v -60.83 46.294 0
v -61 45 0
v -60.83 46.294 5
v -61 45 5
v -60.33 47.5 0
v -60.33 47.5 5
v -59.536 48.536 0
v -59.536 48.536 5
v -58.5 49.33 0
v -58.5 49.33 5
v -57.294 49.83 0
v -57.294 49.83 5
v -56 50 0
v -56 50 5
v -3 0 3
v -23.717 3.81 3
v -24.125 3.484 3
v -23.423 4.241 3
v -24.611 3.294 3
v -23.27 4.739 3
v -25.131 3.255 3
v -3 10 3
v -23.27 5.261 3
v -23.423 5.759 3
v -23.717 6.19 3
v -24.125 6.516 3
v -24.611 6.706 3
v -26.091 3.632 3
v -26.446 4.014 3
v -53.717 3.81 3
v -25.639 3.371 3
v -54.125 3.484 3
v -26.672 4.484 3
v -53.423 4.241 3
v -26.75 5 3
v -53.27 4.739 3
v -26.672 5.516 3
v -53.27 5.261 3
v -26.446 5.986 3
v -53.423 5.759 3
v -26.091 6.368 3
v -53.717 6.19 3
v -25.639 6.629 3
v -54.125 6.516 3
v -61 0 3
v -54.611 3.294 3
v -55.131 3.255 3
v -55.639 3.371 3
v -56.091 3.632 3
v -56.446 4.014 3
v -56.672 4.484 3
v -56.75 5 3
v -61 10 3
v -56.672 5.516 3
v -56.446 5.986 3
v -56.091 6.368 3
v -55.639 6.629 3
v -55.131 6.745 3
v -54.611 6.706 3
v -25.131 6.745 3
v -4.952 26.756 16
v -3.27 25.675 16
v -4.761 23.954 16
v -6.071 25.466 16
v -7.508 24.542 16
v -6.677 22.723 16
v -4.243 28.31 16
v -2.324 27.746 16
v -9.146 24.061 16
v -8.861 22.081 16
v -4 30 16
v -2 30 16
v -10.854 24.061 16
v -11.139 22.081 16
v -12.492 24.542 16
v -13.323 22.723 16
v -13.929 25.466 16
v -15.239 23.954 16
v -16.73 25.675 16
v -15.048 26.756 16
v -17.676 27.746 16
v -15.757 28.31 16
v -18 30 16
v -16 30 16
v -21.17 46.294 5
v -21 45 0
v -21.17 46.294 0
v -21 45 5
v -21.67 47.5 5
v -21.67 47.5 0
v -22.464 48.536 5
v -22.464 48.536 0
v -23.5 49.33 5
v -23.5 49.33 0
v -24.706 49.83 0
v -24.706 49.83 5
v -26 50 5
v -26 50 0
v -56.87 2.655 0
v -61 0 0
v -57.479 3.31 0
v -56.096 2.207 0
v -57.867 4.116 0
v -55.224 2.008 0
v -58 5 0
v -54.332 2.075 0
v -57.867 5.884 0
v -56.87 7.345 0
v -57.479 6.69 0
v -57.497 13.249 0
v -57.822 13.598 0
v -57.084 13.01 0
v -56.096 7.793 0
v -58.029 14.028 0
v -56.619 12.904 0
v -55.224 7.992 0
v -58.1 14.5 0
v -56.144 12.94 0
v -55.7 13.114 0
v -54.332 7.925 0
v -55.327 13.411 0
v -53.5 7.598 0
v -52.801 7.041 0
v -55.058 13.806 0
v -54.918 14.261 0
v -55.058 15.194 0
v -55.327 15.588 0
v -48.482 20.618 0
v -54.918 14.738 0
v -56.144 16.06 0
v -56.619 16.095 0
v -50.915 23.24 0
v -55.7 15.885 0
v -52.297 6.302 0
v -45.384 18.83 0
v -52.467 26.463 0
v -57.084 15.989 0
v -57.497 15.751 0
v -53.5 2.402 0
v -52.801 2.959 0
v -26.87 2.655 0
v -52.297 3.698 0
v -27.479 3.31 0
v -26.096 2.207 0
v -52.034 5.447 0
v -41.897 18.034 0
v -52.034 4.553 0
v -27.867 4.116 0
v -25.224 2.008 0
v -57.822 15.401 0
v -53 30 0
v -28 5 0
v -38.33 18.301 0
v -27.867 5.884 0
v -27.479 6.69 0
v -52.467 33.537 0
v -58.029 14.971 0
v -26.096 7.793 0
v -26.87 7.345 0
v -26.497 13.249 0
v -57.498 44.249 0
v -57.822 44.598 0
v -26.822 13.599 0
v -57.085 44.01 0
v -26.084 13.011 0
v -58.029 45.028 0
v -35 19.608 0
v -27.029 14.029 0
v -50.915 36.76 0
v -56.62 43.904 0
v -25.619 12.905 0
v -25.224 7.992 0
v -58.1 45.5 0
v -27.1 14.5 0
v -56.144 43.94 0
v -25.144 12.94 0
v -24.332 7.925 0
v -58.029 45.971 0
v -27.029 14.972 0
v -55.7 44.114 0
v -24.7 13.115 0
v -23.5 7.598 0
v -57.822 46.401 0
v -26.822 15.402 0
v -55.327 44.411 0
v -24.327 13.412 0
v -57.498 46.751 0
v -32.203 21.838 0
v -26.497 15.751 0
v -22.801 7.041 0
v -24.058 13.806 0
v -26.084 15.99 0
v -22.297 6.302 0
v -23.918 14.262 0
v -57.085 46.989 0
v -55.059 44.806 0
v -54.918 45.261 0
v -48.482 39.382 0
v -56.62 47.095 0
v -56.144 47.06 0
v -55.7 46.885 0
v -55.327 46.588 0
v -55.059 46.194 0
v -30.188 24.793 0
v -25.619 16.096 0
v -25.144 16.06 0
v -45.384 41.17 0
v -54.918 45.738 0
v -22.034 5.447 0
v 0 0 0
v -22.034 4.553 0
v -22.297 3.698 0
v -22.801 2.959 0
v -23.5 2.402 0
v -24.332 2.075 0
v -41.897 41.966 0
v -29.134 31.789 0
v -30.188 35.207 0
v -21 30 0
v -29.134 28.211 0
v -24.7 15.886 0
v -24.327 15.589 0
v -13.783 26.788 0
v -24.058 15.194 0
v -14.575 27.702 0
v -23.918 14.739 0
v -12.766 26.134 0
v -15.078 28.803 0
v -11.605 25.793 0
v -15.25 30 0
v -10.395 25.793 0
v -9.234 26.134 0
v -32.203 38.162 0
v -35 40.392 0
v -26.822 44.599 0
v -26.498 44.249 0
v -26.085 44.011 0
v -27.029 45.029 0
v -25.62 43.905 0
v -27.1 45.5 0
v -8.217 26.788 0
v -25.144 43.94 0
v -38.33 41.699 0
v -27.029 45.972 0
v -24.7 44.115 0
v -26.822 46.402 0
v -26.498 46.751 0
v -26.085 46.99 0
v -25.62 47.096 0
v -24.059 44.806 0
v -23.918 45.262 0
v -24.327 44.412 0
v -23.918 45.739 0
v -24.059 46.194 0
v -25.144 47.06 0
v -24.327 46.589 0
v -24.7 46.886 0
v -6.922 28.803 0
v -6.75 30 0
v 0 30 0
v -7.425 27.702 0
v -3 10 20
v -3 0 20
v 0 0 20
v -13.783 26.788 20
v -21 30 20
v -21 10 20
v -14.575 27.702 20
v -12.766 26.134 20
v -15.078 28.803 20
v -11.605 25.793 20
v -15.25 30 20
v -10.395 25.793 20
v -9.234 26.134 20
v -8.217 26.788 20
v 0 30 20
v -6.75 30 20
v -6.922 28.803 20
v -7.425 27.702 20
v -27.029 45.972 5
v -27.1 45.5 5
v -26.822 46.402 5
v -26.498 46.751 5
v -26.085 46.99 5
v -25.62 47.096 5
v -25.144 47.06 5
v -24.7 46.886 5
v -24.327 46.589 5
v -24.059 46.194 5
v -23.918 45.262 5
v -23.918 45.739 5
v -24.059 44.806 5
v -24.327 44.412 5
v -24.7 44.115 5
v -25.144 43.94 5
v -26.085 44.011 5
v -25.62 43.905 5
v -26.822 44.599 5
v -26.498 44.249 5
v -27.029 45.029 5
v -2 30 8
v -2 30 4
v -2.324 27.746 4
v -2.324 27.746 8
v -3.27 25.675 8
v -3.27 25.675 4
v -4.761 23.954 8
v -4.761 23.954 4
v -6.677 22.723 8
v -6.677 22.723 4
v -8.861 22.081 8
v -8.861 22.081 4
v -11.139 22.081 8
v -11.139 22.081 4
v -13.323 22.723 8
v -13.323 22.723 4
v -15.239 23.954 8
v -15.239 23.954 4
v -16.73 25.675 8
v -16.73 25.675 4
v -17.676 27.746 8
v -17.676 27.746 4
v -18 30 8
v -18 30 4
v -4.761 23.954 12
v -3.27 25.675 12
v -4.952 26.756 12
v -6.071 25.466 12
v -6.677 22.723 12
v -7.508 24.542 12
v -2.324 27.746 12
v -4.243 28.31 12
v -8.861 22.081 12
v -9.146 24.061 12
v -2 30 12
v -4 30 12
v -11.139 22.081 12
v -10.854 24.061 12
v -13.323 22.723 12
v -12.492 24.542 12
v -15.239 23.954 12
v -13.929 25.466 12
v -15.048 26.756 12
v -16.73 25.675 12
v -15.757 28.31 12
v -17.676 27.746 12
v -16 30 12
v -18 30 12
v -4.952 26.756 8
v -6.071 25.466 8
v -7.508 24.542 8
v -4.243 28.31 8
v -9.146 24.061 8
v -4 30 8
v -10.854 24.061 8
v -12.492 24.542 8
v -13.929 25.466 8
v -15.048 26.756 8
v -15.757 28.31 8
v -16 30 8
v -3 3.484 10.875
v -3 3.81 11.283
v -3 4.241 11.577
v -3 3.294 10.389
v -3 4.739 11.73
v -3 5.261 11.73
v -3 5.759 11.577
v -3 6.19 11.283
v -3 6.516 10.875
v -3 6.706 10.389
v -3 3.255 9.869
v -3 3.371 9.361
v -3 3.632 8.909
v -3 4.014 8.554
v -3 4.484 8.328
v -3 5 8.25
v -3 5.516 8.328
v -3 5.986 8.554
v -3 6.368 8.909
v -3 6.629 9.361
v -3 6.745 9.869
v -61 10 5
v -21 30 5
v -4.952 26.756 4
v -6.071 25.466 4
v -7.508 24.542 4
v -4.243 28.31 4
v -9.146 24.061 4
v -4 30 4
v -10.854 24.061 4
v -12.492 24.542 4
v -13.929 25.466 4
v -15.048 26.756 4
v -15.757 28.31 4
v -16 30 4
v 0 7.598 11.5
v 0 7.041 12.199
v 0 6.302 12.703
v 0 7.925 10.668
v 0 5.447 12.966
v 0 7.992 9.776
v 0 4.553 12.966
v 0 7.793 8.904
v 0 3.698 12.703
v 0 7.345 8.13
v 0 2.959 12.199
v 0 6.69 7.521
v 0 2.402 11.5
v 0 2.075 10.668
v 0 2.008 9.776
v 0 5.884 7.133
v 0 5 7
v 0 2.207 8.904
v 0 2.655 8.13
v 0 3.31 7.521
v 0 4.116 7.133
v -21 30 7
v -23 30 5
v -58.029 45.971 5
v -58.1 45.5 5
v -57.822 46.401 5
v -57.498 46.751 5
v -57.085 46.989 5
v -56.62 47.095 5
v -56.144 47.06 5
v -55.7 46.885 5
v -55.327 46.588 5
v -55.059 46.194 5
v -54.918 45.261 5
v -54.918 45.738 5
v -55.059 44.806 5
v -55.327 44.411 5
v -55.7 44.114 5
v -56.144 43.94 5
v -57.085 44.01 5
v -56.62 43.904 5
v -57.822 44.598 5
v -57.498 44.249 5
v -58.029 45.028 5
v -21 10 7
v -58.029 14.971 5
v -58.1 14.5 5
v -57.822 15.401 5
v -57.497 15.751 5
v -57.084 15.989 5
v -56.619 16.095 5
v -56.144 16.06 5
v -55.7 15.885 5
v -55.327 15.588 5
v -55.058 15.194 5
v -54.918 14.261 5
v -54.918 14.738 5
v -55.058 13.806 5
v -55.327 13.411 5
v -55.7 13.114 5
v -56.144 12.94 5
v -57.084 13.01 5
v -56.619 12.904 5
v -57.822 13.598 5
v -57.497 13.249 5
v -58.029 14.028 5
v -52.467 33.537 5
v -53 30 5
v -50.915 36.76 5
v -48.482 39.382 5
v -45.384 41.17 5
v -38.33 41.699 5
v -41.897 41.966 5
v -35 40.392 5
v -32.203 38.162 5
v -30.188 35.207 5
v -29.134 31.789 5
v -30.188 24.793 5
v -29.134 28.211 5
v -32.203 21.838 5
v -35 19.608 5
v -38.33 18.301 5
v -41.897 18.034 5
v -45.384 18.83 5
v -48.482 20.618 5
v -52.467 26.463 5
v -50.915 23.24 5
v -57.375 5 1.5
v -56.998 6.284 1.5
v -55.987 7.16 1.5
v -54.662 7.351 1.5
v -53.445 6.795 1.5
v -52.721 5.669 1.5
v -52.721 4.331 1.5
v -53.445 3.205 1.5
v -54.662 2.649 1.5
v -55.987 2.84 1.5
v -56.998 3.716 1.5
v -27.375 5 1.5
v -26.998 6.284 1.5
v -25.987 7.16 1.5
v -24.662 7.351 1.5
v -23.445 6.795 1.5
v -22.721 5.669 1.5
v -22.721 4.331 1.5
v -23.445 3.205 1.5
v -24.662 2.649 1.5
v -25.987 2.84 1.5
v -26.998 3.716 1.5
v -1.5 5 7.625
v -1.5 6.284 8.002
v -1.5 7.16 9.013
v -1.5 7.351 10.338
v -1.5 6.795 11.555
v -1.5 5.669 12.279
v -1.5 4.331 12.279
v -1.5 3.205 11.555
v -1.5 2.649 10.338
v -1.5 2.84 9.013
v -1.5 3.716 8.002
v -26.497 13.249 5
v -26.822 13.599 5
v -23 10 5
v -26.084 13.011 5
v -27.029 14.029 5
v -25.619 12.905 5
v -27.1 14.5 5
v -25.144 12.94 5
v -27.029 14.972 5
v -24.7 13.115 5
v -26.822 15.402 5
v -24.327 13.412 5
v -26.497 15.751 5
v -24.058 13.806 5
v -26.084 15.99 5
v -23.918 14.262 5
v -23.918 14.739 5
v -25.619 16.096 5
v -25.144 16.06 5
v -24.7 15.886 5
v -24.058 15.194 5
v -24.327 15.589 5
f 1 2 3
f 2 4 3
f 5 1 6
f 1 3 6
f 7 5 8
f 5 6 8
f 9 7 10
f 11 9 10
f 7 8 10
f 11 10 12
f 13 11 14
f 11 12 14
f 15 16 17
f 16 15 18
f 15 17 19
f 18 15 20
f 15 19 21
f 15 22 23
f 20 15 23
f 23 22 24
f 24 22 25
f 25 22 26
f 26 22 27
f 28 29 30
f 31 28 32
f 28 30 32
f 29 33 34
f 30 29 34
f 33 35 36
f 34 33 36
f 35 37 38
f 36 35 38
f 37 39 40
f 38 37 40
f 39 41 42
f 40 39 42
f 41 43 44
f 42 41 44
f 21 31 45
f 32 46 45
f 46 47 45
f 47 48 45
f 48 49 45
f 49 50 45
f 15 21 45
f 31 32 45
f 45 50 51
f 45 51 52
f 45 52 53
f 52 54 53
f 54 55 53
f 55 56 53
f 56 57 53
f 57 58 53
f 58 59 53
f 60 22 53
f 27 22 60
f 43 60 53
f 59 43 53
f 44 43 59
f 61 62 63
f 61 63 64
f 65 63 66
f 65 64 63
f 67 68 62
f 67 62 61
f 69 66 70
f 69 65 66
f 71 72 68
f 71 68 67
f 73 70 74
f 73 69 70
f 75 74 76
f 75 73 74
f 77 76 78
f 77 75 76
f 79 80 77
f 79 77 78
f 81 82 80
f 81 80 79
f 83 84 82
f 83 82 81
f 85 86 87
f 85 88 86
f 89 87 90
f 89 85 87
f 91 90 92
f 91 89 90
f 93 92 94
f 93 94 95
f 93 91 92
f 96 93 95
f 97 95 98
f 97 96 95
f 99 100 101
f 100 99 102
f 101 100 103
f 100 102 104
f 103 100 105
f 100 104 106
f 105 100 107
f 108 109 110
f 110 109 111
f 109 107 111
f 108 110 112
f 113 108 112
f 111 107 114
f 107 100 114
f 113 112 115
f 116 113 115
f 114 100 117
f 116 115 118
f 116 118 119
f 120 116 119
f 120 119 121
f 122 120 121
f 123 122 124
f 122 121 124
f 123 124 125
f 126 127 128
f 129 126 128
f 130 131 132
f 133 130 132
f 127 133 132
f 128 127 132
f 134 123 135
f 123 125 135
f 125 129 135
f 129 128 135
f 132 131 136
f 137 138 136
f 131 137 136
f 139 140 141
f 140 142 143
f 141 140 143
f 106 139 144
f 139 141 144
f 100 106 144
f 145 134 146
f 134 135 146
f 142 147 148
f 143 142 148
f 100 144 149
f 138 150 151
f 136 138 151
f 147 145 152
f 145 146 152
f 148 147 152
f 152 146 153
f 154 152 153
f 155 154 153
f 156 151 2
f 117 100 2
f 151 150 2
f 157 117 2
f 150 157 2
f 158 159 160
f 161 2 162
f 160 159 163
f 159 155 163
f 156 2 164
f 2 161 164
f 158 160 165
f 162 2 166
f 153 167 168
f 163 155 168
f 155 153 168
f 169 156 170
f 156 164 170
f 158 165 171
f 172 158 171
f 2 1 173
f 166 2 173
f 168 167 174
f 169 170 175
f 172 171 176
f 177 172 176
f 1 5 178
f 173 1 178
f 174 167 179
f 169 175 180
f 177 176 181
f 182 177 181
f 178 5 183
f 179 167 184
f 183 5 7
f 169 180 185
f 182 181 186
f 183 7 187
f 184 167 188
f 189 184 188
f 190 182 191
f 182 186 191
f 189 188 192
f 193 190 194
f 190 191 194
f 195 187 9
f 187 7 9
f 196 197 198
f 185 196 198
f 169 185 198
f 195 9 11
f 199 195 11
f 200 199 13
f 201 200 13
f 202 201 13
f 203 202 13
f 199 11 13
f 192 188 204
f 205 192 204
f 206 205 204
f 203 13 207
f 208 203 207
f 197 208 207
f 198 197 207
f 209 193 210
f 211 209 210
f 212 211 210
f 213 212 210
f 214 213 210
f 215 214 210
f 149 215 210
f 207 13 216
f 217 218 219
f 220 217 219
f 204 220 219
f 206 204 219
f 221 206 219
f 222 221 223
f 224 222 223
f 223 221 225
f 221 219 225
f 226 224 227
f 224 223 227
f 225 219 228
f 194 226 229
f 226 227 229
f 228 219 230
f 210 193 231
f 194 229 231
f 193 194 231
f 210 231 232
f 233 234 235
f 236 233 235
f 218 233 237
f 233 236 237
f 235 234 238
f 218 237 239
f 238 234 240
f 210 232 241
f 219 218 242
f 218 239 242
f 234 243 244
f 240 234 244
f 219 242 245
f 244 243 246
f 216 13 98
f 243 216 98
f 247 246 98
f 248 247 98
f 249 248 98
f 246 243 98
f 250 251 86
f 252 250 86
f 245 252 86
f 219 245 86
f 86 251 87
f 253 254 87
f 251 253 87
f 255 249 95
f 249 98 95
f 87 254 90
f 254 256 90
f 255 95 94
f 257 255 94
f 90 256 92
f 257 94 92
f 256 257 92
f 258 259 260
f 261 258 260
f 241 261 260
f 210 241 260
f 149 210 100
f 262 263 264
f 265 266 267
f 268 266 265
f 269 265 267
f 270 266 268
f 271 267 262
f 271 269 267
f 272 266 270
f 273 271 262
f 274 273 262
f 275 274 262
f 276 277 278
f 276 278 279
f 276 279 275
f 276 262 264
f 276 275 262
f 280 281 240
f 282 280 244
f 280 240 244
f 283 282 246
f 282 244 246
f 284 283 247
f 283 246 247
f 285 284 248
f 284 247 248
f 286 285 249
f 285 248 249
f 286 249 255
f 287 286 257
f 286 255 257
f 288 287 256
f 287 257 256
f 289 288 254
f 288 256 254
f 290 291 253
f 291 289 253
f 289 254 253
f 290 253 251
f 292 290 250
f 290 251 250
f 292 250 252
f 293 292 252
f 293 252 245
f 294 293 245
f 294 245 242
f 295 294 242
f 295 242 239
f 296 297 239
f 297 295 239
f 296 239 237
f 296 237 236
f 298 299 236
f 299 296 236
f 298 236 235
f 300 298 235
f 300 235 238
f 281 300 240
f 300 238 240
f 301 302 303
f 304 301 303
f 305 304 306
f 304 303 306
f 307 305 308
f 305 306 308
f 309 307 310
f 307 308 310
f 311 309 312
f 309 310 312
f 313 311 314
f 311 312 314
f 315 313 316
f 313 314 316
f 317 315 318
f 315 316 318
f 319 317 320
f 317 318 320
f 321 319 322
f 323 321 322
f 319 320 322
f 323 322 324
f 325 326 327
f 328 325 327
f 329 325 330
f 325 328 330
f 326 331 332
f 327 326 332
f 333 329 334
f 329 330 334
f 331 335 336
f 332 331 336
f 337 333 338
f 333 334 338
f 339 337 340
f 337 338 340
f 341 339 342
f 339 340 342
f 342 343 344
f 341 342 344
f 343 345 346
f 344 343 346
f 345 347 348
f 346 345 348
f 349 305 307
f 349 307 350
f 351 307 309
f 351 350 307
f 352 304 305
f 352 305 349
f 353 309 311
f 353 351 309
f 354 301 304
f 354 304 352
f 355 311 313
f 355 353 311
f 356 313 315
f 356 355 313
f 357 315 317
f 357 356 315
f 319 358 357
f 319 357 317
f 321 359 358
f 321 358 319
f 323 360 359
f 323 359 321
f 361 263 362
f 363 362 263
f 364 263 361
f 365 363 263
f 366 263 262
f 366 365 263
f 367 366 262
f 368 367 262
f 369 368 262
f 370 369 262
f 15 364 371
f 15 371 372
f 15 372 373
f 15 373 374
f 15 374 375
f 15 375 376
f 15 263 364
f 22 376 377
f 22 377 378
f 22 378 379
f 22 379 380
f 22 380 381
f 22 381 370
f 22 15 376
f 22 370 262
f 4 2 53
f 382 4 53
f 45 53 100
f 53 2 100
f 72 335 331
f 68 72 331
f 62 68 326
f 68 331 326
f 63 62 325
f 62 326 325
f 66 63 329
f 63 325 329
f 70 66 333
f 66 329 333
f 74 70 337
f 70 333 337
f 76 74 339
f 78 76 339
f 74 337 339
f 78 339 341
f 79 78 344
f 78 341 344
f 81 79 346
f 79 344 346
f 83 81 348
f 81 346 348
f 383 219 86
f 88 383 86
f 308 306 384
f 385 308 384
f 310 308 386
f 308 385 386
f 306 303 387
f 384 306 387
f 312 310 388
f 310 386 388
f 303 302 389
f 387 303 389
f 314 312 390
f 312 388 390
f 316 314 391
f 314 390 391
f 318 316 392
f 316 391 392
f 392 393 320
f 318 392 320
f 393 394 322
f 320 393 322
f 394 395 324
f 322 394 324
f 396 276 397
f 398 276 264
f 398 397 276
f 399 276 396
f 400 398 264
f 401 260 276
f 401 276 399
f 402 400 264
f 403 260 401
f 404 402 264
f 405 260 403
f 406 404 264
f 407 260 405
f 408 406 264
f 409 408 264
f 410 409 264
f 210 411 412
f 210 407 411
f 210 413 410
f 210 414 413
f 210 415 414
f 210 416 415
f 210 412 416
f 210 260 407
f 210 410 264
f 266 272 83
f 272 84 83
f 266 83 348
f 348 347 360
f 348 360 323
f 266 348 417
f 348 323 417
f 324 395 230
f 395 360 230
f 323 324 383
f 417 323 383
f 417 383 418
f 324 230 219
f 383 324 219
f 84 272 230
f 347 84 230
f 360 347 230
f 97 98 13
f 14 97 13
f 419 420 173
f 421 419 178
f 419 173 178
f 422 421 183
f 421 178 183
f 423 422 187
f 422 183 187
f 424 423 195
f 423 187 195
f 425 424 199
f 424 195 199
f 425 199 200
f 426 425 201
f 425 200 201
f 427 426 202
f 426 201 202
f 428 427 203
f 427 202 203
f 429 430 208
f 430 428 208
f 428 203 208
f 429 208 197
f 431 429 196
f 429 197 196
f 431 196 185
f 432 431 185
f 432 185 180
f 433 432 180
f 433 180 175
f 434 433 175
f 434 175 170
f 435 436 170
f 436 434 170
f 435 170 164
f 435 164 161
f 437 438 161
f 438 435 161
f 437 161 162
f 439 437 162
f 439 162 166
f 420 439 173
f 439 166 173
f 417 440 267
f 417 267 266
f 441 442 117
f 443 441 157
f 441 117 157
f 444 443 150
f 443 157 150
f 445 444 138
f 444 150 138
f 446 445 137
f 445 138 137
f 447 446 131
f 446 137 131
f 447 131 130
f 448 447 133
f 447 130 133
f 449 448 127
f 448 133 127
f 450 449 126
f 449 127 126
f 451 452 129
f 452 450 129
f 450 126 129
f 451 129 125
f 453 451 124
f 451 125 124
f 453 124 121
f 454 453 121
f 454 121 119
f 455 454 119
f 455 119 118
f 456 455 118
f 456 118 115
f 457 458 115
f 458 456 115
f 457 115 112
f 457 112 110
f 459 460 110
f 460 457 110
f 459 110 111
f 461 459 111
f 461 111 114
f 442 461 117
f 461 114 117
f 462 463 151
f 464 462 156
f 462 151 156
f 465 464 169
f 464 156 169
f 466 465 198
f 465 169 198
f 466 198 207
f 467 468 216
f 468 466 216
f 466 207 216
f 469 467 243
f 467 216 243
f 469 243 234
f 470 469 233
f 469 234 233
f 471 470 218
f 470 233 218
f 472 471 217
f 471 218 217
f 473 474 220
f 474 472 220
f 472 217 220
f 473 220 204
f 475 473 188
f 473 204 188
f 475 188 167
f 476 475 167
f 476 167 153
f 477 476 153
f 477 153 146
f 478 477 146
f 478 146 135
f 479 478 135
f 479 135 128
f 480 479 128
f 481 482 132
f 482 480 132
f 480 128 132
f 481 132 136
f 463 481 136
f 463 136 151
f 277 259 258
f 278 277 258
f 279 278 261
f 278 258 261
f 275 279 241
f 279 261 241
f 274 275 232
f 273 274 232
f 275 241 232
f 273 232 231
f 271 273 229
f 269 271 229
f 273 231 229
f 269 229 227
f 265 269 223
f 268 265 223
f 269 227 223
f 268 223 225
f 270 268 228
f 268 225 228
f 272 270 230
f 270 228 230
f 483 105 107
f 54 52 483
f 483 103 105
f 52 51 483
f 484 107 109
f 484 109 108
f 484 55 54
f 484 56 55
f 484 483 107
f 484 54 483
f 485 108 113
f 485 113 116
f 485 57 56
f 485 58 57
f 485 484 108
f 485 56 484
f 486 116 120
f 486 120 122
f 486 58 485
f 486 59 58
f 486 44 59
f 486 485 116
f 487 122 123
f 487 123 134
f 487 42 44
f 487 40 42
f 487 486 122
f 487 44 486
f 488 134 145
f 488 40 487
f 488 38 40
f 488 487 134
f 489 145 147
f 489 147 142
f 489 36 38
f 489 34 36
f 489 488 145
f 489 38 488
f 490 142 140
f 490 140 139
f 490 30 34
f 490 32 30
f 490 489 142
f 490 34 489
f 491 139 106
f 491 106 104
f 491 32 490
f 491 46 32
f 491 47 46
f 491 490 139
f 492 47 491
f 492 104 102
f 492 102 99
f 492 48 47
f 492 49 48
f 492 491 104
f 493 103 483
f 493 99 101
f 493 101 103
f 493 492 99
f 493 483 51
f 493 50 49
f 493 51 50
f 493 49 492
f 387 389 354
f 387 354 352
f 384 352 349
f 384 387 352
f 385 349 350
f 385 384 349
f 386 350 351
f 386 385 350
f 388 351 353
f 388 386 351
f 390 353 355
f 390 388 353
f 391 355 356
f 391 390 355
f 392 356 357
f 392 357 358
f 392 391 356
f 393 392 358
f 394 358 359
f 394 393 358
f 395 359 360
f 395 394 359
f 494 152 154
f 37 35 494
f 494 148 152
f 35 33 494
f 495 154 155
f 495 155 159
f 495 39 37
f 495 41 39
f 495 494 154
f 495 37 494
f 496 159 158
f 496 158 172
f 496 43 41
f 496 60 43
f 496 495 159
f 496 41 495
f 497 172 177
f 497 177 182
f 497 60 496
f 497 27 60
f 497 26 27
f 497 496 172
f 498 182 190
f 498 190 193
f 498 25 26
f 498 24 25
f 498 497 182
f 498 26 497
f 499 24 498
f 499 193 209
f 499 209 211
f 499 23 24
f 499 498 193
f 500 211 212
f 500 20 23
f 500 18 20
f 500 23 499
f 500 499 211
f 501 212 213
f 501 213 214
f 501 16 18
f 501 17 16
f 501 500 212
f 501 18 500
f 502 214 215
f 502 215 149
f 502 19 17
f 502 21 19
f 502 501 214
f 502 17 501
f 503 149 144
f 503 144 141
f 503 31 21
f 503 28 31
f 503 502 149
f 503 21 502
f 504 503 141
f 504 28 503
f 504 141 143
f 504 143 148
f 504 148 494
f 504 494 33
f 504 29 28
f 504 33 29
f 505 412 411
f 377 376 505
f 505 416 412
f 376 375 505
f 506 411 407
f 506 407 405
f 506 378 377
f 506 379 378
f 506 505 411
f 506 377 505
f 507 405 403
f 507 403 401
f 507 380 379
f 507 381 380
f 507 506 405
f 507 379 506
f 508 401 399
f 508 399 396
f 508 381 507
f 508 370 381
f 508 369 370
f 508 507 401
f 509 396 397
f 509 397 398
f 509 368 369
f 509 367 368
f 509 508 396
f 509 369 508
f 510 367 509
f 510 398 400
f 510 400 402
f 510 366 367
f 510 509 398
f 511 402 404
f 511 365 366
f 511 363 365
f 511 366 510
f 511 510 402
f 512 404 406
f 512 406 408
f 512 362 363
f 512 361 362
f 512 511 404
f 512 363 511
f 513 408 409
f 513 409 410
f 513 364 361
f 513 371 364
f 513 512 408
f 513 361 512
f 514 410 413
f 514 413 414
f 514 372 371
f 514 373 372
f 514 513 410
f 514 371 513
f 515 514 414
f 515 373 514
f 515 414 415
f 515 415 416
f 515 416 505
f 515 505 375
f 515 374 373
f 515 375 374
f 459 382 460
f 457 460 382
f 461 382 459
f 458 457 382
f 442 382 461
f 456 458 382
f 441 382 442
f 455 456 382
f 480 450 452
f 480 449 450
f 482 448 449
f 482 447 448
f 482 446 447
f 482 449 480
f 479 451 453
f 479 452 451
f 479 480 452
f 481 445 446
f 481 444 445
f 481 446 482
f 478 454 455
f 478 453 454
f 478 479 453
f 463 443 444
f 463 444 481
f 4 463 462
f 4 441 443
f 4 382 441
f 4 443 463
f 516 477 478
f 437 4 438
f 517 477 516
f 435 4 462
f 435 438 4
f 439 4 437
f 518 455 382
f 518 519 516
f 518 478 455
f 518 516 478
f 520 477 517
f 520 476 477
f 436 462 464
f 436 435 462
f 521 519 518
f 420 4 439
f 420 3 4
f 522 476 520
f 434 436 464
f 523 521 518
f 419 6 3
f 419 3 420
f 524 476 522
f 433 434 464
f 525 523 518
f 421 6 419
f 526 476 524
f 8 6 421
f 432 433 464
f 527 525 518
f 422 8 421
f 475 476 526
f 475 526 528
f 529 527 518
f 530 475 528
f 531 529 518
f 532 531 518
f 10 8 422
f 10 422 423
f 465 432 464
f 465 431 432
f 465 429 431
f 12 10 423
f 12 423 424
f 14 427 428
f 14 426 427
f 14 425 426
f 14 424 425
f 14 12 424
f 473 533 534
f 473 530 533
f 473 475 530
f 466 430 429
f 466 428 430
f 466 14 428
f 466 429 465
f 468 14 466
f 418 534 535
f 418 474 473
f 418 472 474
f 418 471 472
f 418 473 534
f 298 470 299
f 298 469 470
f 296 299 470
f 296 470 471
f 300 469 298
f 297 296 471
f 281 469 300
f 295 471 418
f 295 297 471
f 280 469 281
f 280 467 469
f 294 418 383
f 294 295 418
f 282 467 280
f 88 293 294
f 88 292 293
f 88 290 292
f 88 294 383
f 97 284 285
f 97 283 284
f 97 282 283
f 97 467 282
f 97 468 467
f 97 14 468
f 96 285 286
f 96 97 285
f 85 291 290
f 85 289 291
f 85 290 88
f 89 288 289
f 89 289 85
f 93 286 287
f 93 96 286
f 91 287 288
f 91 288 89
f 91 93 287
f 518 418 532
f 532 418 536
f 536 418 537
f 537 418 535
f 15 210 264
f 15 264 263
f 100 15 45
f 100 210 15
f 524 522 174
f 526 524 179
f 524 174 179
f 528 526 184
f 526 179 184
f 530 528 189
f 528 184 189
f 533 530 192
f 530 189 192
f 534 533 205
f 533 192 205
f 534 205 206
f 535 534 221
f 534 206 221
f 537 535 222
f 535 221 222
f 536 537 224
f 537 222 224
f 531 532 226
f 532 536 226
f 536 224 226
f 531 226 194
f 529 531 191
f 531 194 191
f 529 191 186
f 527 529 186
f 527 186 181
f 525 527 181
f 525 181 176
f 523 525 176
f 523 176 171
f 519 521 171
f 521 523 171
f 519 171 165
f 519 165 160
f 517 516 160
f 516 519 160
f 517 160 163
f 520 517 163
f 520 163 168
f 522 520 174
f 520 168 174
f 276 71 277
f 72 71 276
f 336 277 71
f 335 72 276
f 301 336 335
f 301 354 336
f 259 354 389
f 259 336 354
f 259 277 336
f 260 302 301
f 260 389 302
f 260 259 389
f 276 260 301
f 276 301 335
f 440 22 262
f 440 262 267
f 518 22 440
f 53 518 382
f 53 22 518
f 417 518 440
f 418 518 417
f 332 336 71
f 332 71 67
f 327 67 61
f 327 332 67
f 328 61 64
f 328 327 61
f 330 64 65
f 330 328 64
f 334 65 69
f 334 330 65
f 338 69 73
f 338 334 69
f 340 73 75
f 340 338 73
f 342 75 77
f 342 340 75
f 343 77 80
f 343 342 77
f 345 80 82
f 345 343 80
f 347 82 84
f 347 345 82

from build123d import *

# Parameters (mm, degrees)
BOX008_W          = 58
BOX008_H          = 10
BOX008_DEPTH      = 3
CONE_PITCH_ANGLE  = 90
CYLINDER001_R     = 6
CYLINDER001_DEPTH = 4
CYLINDER_R        = 8
CYLINDER_DEPTH    = 4
PAD001_DEPTH      = 15
SKETCH_R          = 12
SKETCH_R_2        = 1.6
PAD_DEPTH         = 20
CHAMFER003_SIZE   = 2
FILLET_R          = 5


with BuildPart() as espai_fusta:
    # Box008 → Box008 (new body)
    with BuildSketch(Plane(origin=(3, 0, 3), x_dir=(1, 0, 0), z_dir=(0, 0, 1))):
        with Locations((29, 5)):
            Rectangle(BOX008_W, BOX008_H)
    extrude(amount=BOX008_DEPTH)


with BuildPart() as cone_forat_cargol003:
    # Cone002 → Cone002 (revolve)
    with BuildSketch(Plane(origin=(55, 5, 0), x_dir=(1, 0, 0), z_dir=(0, -1, 0))):
        Polygon((0, 0), (3, 0), (1.75, 3), (0, 3), align=None)
    revolve(axis=Axis((55, 5, 0), (0, 0, 1)))


with BuildPart() as cone_forat_cargol002:
    # Cone001 → Cone001 (revolve)
    with BuildSketch(Plane(origin=(25, 5, 0), x_dir=(1, 0, 0), z_dir=(0, -1, 0))):
        Polygon((0, 0), (3, 0), (1.75, 3), (0, 3), align=None)
    revolve(axis=Axis((25, 5, 0), (0, 0, 1)))


with BuildPart() as cone_forat_cargol001:
    # Cone → Cone (revolve)
    with BuildSketch(Plane.XZ):
        Polygon((0, 0), (3, 0), (1.75, 3), (0, 3), align=None)
    revolve(axis=Axis((0, 0, 0), (0, 0, 1)))


with BuildPart() as cone_forat_cargol001_1:
    # Cone pitch: moved
    add(cone_forat_cargol001.part.rotate(Axis((0, 0, 0), (0, 1, 0)), CONE_PITCH_ANGLE))


with BuildPart() as cone_forat_cargol001_2:
    # Cone placement: moved
    add(cone_forat_cargol001_1.part.moved(Location((0, 5, 10))))


with BuildPart() as cyl_brida_int:
    # Cylinder001 → Cylinder001 (new body)
    with BuildSketch(Plane.XY):
        Circle(CYLINDER001_R)
    extrude(amount=CYLINDER001_DEPTH)


with BuildPart() as cyl_brida_ext:
    # Cylinder → Cylinder (new body)
    with BuildSketch(Plane.XY):
        Circle(CYLINDER_R)
    extrude(amount=CYLINDER_DEPTH)


with BuildPart() as espai_brida002:
    # Cut002 base: copy of Cyl-brida-ext
    add(cyl_brida_ext.part)

    # Cut002: cut Cyl-brida-int
    add(cyl_brida_int.part, mode=Mode.SUBTRACT)


with BuildPart() as espai_brida002_1:
    # Cut002 placement: moved
    add(espai_brida002.part.moved(Location((10, 30, 12))))


with BuildPart() as espai_brida001:
    # Cut001 base: copy of Cyl-brida-ext
    add(cyl_brida_ext.part)

    # Cut001: cut Cyl-brida-int
    add(cyl_brida_int.part, mode=Mode.SUBTRACT)


with BuildPart() as espai_brida001_1:
    # Cut001 placement: moved
    add(espai_brida001.part.moved(Location((10, 30, 4))))


with BuildPart() as pad_perfil_retalla:
    # Sketch001 → Pad001 (new body)
    with BuildSketch(Plane.XY.offset(5)):
        Polygon((3, 10), (21, 10), (21, 50), (61, 50), (61, 0), (3, 0), align=None)
    extrude(amount=PAD001_DEPTH)


with BuildPart() as y_end_motor:
    # Sketch → Pad (new body)
    with BuildSketch(Plane.XY):
        with BuildLine():
            ThreePointArc((6.75, 30), (11, 25.75), (15.25, 30))
            Line((15.25, 30), (21, 30))
            Line((21, 30), (21, 50))
            Line((21, 50), (61, 50))
            Line((61, 50), (61, 0))
            Line((0, 0), (61, 0))
            Line((0, 30), (0, 0))
            Line((6.75, 30), (0, 30))
        make_face()
        with Locations((41, 30)):
            Circle(SKETCH_R, mode=Mode.SUBTRACT)
        with Locations((25.500268, 45.500268)):
            Circle(SKETCH_R_2, mode=Mode.SUBTRACT)
        with Locations((25.499732, 14.500268)):
            Circle(SKETCH_R_2, mode=Mode.SUBTRACT)
        with Locations((56.499732, 14.499732)):
            Circle(SKETCH_R_2, mode=Mode.SUBTRACT)
        with Locations((56.500268, 45.499732)):
            Circle(SKETCH_R_2, mode=Mode.SUBTRACT)
    extrude(amount=PAD_DEPTH)

    # Cut: cut Pad-perfil-retalla
    add(pad_perfil_retalla.part, mode=Mode.SUBTRACT)

    # Cut003: cut espai-brida001
    add(espai_brida001_1.part, mode=Mode.SUBTRACT)

    # Cut004: cut espai-brida002
    add(espai_brida002_1.part, mode=Mode.SUBTRACT)

    # Cut005: cut Cone-forat-cargol001
    add(cone_forat_cargol001_2.part, mode=Mode.SUBTRACT)

    # Cut006: cut Cone-forat-cargol002
    add(cone_forat_cargol002.part, mode=Mode.SUBTRACT)

    # Cut007: cut Cone-forat-cargol003
    add(cone_forat_cargol003.part, mode=Mode.SUBTRACT)

    # Cut027: cut espai-fusta
    add(espai_fusta.part, mode=Mode.SUBTRACT)

    # Chamfer003
    chamfer003_edges = [y_end_motor.edges().sort_by_distance(p)[0] for p in [
        (21, 20, 5),
    ]]
    chamfer(chamfer003_edges, length=CHAMFER003_SIZE)

    # Fillet
    fillet_edges = [y_end_motor.edges().sort_by_distance(p)[0] for p in [
        (21, 50, 2.5),
        (61, 50, 2.5),
    ]]
    fillet(fillet_edges, radius=FILLET_R)


with BuildPart() as part_mirroring:
    # Part__Mirroring: instance of y-end-motor
    add(y_end_motor.part.mirror(Plane(origin=(0, 0, 0), x_dir=(0, -1, 0), z_dir=(1, 0, 0))))


solid = part_mirroring.part
